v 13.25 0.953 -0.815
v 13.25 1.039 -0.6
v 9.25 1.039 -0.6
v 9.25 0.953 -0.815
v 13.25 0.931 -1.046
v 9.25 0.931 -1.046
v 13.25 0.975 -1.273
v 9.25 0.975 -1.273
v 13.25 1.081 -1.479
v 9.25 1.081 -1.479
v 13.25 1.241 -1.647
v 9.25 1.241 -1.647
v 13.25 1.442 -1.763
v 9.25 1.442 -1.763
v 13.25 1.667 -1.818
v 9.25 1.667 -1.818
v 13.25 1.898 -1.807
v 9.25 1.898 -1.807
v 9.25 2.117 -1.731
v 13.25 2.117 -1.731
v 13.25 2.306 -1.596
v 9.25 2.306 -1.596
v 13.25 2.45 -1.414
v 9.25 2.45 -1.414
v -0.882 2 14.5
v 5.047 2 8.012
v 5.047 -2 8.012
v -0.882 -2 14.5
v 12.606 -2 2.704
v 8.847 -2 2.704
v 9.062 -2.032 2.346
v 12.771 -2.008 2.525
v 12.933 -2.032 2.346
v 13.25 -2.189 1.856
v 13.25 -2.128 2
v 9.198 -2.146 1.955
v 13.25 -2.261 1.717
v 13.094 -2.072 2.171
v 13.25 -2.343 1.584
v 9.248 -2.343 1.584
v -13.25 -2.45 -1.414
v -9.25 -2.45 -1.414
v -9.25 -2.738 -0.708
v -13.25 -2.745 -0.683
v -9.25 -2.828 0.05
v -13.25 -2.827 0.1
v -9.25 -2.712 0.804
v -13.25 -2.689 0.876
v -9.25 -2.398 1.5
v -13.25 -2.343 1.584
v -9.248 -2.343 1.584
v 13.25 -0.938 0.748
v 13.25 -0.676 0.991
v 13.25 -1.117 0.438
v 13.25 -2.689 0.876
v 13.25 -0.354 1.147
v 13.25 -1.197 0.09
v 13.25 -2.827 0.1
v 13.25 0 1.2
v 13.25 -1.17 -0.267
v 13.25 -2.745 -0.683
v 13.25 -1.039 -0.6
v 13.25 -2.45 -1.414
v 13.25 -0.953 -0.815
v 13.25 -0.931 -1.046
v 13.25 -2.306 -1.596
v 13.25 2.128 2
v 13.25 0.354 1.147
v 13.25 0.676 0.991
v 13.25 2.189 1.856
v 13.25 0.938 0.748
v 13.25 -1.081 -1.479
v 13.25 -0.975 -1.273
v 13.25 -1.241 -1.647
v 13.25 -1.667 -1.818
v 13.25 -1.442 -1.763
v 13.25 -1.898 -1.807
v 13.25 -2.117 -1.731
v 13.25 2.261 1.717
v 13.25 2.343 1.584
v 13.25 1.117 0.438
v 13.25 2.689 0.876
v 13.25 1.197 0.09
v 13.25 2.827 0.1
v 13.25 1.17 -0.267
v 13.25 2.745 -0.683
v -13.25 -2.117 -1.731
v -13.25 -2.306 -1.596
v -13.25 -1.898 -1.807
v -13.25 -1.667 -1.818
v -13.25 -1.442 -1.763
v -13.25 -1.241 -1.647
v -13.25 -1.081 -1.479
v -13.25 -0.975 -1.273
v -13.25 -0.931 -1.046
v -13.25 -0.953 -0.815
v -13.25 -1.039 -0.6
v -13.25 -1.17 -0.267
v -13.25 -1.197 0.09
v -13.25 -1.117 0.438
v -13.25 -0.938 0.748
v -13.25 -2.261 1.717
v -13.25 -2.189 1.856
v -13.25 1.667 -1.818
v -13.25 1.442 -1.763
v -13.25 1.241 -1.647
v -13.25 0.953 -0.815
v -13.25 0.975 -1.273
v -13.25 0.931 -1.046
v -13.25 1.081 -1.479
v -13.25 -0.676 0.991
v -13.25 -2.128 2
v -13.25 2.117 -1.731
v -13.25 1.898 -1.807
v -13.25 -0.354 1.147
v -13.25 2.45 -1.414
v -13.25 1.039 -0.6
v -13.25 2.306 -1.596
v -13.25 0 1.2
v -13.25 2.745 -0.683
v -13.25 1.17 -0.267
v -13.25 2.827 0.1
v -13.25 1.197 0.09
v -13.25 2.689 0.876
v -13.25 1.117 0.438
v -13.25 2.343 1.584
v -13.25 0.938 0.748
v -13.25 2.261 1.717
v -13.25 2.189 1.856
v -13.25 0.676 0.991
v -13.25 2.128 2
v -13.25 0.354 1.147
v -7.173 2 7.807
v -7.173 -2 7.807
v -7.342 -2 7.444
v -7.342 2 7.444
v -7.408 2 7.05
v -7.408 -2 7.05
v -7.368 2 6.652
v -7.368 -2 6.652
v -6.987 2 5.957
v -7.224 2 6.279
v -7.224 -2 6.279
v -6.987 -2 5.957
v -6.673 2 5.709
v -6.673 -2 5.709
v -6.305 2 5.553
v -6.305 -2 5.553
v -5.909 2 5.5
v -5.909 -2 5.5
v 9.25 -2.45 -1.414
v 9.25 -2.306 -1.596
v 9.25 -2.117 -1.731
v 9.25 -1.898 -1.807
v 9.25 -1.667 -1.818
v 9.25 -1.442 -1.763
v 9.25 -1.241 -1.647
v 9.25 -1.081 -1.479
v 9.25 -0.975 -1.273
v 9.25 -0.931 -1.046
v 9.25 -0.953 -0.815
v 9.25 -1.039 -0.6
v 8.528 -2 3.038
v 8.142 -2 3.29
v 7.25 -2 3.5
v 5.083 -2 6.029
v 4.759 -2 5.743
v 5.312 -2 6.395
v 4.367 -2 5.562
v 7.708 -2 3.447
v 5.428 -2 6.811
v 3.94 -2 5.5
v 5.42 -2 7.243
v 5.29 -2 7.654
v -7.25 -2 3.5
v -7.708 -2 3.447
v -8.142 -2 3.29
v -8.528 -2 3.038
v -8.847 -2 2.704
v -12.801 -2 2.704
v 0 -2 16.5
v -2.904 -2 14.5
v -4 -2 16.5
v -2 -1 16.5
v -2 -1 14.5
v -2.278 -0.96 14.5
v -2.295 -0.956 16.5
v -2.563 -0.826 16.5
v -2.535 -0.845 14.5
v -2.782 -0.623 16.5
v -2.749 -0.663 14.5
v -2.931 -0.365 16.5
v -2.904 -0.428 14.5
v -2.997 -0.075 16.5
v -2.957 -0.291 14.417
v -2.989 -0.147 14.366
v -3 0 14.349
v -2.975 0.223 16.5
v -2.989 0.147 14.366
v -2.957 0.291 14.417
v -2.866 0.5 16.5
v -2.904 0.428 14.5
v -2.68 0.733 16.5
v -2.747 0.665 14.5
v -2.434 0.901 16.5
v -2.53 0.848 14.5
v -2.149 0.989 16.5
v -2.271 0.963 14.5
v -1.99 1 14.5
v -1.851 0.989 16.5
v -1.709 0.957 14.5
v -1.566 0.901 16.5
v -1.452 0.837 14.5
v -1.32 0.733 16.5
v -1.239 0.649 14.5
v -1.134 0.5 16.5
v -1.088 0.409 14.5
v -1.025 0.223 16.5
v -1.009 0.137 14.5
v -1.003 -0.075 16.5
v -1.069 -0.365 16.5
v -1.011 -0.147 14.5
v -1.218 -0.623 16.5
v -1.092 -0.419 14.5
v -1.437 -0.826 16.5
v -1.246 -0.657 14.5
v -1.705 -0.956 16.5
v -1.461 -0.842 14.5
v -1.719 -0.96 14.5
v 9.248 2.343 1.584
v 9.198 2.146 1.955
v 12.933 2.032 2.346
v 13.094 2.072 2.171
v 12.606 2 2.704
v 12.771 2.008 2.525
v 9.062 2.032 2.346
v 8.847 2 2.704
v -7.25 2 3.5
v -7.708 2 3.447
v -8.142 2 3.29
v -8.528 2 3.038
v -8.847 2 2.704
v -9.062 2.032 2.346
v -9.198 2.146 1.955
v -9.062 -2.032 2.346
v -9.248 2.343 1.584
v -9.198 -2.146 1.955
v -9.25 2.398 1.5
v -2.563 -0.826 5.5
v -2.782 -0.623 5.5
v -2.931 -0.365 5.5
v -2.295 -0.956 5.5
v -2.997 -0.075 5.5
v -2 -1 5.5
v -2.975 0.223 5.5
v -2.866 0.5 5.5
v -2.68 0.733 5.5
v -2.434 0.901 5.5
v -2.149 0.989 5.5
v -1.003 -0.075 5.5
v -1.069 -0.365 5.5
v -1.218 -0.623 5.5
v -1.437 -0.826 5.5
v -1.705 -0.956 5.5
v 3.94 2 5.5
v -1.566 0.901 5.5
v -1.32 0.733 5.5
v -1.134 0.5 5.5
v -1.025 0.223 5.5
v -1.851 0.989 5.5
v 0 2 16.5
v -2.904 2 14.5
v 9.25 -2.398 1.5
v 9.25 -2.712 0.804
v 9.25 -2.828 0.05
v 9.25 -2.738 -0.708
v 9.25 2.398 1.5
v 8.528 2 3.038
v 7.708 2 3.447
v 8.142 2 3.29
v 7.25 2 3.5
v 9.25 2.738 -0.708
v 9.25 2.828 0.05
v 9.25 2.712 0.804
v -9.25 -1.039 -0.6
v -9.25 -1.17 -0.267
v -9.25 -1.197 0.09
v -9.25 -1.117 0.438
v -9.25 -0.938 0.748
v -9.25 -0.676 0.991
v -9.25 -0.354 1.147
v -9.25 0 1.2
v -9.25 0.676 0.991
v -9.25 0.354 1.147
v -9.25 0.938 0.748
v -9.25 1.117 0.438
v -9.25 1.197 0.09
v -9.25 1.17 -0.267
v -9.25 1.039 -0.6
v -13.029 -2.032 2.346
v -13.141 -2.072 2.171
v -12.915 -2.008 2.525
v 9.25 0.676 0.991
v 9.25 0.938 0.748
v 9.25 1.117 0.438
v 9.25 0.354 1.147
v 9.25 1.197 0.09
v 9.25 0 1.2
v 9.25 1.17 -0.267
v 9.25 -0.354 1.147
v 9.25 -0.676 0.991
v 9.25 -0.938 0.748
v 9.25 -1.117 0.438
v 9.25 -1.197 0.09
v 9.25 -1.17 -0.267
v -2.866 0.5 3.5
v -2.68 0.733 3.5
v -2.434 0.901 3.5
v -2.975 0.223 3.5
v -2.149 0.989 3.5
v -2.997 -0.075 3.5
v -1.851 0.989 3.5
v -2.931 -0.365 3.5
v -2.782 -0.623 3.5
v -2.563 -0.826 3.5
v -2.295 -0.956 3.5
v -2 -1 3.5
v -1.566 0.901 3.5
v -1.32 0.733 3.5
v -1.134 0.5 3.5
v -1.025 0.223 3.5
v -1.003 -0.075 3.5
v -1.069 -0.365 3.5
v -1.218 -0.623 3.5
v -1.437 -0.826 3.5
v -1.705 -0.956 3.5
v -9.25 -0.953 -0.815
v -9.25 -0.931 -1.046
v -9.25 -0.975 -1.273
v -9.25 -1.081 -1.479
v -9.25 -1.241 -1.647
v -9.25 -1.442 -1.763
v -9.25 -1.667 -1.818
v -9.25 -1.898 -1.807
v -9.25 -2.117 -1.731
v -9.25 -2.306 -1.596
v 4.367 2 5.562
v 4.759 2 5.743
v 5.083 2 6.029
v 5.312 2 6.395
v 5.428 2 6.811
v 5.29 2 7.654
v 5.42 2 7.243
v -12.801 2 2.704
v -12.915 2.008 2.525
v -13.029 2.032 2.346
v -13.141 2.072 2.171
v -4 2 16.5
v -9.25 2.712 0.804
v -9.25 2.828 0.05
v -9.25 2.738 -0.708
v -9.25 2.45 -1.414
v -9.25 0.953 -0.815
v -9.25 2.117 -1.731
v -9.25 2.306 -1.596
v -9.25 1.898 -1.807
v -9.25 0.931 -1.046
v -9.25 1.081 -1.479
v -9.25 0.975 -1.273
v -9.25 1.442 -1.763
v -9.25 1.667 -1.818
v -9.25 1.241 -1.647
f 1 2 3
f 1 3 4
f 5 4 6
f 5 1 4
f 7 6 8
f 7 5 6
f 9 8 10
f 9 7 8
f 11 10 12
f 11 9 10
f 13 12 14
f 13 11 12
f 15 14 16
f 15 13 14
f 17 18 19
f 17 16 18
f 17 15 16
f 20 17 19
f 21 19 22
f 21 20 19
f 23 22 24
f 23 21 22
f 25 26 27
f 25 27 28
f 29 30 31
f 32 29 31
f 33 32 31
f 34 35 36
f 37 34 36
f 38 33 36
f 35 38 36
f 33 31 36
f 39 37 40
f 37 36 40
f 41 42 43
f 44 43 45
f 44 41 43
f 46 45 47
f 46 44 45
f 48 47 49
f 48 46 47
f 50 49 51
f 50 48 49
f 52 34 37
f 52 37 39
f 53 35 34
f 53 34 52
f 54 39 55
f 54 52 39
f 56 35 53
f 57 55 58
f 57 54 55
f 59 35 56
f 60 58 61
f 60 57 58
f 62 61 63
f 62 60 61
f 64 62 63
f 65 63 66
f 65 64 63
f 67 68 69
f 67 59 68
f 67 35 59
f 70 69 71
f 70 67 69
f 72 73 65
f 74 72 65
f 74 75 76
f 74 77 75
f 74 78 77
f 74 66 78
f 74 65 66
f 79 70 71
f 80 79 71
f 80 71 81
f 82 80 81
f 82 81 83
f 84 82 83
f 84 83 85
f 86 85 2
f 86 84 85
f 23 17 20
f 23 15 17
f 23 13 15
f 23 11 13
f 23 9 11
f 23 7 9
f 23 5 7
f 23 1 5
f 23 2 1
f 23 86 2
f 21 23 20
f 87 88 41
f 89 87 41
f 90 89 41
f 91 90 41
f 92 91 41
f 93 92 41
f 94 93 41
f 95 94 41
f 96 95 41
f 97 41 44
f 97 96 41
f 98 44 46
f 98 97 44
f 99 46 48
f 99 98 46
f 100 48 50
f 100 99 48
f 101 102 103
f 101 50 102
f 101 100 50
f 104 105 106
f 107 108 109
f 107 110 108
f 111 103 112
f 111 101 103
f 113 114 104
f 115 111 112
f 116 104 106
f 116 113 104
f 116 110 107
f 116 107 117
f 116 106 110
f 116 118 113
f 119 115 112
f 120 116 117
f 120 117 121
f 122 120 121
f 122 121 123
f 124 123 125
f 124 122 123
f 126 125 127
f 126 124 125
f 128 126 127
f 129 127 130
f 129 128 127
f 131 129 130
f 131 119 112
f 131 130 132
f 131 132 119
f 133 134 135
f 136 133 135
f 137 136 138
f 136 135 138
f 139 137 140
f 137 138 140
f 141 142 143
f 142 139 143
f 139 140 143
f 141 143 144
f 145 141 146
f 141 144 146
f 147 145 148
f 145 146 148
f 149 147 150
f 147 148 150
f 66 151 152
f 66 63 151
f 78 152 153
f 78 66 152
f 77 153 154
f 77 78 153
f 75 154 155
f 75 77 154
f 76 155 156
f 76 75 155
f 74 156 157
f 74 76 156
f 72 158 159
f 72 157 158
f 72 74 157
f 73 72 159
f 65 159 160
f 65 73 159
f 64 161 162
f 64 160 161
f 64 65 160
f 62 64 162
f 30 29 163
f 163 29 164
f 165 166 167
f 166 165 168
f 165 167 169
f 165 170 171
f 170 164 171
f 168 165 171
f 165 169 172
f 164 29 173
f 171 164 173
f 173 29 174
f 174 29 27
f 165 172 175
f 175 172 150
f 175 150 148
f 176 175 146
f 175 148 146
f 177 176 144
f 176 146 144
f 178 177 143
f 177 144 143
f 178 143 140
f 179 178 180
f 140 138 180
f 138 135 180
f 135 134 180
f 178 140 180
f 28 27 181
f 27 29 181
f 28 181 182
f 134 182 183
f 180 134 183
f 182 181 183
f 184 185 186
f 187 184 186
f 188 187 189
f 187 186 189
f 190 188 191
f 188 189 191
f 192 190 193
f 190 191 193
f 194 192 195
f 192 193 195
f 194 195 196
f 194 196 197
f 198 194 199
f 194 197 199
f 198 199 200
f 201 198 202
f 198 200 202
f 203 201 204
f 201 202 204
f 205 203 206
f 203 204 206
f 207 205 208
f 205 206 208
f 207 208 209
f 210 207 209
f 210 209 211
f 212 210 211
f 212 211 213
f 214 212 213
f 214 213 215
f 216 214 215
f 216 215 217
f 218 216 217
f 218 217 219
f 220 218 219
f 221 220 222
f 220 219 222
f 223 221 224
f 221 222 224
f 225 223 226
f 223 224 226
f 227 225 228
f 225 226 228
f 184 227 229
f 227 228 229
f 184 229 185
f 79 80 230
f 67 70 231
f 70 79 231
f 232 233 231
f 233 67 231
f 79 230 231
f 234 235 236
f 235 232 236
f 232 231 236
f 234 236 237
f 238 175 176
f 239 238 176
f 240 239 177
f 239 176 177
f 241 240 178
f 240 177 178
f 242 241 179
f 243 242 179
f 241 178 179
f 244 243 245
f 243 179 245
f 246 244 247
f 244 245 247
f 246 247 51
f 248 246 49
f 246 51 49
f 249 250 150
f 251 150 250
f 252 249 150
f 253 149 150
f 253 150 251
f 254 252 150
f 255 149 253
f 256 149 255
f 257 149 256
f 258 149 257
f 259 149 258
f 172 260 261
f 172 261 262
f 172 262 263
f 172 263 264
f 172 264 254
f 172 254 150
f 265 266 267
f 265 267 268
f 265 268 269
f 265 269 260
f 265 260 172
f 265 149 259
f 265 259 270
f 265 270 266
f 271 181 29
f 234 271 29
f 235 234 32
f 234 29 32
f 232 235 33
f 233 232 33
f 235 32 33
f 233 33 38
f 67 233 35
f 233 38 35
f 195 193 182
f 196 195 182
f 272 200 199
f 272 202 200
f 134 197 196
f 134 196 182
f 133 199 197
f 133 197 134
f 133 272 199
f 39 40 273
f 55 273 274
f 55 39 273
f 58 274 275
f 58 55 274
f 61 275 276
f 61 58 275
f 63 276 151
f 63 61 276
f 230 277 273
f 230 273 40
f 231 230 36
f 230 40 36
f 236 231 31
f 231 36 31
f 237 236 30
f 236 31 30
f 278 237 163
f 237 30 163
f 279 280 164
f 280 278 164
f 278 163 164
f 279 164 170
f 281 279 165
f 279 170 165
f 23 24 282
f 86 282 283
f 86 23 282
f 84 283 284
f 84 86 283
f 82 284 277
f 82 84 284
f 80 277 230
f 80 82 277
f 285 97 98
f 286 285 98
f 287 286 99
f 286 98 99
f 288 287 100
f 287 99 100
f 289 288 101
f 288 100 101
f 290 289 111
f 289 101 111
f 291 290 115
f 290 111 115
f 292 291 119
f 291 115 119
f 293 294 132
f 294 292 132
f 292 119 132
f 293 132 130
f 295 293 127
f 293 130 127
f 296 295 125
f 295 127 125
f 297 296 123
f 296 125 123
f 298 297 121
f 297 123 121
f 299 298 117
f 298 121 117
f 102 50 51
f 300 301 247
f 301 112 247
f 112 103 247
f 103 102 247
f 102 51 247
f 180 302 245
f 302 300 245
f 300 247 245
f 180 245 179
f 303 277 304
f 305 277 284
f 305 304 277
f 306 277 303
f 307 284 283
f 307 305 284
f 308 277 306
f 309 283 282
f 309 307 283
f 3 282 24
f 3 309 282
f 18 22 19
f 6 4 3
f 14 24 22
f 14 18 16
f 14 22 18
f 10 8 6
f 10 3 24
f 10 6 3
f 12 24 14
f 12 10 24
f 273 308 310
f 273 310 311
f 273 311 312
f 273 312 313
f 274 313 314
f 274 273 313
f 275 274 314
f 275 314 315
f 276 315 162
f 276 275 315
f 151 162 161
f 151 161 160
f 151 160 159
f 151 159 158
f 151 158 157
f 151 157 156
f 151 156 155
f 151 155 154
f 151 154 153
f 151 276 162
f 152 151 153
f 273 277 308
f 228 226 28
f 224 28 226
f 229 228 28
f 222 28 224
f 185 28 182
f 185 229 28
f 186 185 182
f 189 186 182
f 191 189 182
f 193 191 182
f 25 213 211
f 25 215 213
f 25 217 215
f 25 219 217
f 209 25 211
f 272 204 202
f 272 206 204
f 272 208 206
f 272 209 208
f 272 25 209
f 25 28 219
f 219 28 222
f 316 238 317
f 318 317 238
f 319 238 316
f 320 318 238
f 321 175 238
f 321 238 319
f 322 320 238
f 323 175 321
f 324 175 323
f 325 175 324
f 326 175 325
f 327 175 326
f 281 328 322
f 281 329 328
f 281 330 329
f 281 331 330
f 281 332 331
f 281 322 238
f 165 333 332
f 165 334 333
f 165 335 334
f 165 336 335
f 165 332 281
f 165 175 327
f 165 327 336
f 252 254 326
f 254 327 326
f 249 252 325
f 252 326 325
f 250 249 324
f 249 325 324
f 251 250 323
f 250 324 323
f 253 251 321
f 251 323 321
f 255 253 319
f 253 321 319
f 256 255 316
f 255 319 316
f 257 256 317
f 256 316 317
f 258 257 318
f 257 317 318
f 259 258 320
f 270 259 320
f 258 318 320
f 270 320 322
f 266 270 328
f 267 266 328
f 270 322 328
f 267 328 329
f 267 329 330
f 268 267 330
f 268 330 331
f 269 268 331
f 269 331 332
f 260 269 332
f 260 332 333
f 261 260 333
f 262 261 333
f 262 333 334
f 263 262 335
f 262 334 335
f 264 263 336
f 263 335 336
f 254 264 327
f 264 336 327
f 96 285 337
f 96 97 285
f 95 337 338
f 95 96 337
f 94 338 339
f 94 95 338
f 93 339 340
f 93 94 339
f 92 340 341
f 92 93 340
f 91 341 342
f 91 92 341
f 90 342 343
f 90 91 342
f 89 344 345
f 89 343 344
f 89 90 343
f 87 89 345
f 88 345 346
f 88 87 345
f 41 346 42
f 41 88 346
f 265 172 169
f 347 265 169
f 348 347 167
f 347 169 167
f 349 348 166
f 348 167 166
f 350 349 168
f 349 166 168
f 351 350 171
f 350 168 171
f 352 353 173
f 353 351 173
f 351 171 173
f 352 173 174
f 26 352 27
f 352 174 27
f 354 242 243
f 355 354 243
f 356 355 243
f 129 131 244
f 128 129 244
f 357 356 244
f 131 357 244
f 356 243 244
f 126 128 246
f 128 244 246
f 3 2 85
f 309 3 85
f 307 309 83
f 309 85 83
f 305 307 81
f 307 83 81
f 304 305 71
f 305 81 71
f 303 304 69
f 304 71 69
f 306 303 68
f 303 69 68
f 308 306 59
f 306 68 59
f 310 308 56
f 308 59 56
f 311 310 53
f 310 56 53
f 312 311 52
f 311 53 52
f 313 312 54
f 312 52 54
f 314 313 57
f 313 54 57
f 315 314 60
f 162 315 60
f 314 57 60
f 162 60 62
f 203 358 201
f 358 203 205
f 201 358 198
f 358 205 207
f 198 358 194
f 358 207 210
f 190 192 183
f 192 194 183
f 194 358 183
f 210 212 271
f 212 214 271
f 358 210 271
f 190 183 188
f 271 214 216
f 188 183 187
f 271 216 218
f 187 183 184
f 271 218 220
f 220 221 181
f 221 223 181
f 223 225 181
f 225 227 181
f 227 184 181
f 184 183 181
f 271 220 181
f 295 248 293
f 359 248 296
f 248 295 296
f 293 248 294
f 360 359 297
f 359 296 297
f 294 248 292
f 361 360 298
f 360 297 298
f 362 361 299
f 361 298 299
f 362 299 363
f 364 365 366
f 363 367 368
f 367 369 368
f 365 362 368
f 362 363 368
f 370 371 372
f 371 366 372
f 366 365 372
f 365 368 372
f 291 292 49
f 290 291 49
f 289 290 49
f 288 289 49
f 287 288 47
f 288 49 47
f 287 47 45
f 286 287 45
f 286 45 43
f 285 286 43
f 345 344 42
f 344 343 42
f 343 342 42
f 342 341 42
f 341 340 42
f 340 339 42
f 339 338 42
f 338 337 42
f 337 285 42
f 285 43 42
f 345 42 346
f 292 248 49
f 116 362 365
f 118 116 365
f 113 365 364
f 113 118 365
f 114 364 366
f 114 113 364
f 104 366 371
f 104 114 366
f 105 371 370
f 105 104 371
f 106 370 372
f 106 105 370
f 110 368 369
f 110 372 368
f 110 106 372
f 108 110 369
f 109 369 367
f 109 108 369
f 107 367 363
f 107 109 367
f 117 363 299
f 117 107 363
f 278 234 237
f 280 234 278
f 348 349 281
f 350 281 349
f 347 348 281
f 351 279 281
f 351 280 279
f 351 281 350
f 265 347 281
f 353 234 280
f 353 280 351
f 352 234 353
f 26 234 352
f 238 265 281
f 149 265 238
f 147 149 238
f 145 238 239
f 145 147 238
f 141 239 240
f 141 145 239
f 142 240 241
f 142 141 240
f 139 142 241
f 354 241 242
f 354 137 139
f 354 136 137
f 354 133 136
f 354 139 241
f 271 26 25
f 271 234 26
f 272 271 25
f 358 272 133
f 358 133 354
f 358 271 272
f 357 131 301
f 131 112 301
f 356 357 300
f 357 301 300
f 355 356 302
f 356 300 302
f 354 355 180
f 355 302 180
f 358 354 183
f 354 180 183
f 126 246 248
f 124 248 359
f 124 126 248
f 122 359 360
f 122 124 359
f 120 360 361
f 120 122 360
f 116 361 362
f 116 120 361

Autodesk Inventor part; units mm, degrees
ref_plane "YZ Plane" through (0, 0, 0) normal (1, 0, 0) x (0, 1, 0)
ref_plane "XZ Plane" through (0, 0, 0) normal (0, 1, 0) x (-1, 0, 0)
ref_plane "XY Plane" through (0, 0, 0) normal (0, 0, 1) x (1, 0, 0)
sketch "スケッチ1" plane through (0, 0, 0) normal (0, 1, 0) x (-1, 0, 0)
  line L0 (13.25, -2) -> (-13.25, -2)
  line L1 (-13.25, -2) -> (-13.25, 2)
  line L2 (13.25, 2) -> (13.25, -2)
  line L3 (13.25, 2) -> (4, 16.5)
  line L4 (4, 16.5) -> (0, 16.5)
  line L5 (0, 16.5) -> (-13.25, 2)
  line L6 (9.25, 3.5) -> (-9.25, 3.5)
  line L7 (9.25, 3.5) -> (9.25, -2)
  line L8 (-9.25, 3.5) -> (-9.25, -2)
  point P0 (0, 0)
  point P1 (13.25, 0)
  point P2 (0, -2)
  point P3 (2, 16.5)
  dimension "d1" = 4
  dimension "d2" = 4
  dimension "d3" = 16.5
  dimension "d19" = 3.5
  dimension "d32" = 4
  dimension "d33" = 26.5
  dimension "d34" = 4
  dimension "d36" = 4
  dimension "d37" = 2
extrude "押し出し1" add sketch "スケッチ1" along normal mid plane 4 contours L0 L7 L6 L8 L1 L5 L4 L3 L2
sketch "スケッチ3" plane through (-4, 2, 16.5) normal (0, 0, 1) x (1, 0, 0)
  line L0 (0, 0) -> (4, 0) projected
  line L1 (0, -4) -> (0, 0) projected
  point P0 (4, -2)
  point P1 (2, -2)
  point P2 (0, -2)
  point P3 (2, 0)
hole "穴1" at (-2, 0, 16.5) direction (0, 0, -1) diameter 2 end through all
sketch "スケッチ4" plane through (13.25, -2, -2) normal (1, 0, 0) x (0, 0, -1)
  line L0 (0, 4) -> (0, 0) projected
  line L1 (-4, 0) -> (-4, 4) projected
  line L2 (0, 0) -> (-4, 0) projected
  circle A0 centre (-2, 2) radius 1.2
  line L3 (-4, 4) -> (0, 4) projected
  arc A1 (-4, 0) -> (-4, 4) centre (-2, 2) ccw
  circle A2 centre (-0.9929, 3.7444) radius 0.8142
  circle A3 centre (-0.9929, 0.2556) radius 0.8142
  line L4 (-0.9929, 3.7444) -> (-2, 2) construction
  line L5 (-2, 2) -> (-0.9929, 0.2556) construction
  line L6 (-0.9929, 1.0699) -> (-0.9929, 2.9301) construction
  line L7 (0, 2.2089) -> (-0.9929, 3.7444) construction
  point P0 (-2, 2)
  point P1 (-1.4, 3.0392)
  point P2 (-1.4, 0.9608)
  point P3 (-0.2199, 0)
  point P4 (-0.2199, 4)
  point P5 (-0.5858, 4.4495)
  point P6 (-0.5858, -0.4495)
  dimension "d22" = 1.6284
  dimension "d20" = 2.4
  dimension "d21" = 120
  dimension "d23" = 1.8603
extrude "押し出し3" add sketch "スケッチ4" against normal up to surface (4 mm away)
extrude "押し出し4" cut sketch "スケッチ4" against normal up to surface (4 mm away) contours A1 L0 | L0 L2 A3 A0 A2 L3 | L3 A2 A1 | A1 A3 L2 | A0 picked at (-0.1339, 4.0556) picked at (-0.1339, -0.0556)
mirror "ミラー1" about plane through (0, 0, 0) normal (1, 0, 0) of "押し出し3", "押し出し4"
sketch "スケッチ5" plane through (0, 2, 0) normal (0, 1, 0) x (1, 0, 0)
  line L0 (-13.25, -2) -> (-4, -16.5) projected
  line L1 (-4, -16.5) -> (0, -16.5) projected
  line L2 (0, -16.5) -> (13.25, -2) projected
  line L3 (9.25, -3.5) -> (-9.25, -3.5) projected
  line L4 (-2.9036, -14.5) -> (-8.6449, -5.5)
  line L5 (7.3425, -5.5) -> (-0.8817, -14.5)
  line L6 (-0.8817, -14.5) -> (-2.9036, -14.5)
  line L7 (-8.6449, -5.5) -> (7.3425, -5.5)
  point P0 (0, 0)
  dimension "d38" = 2
  dimension "d40" = 2
  dimension "d41" = 2
extrude "押し出し5" cut sketch "スケッチ5" against normal through all
fillet "フィレット4" radius 1.5 2 edges at (-8.6449, 0, 5.5) (7.3425, 0, 5.5)
fillet "フィレット5" radius 2 6 edges at (9.25, 0, 3.5) (-9.25, 0, 3.5) (-11.25, 2, 2) (11.25, 2, 2) (11.25, -2, 2) (-11.25, -2, 2)
equation "\"d34\" = d32"
equation "\"d36\" = d1"
equation "\"d37\" = 0.5 * d32"
equation "\"d40\" = d38"
equation "\"d41\" = d38"
properties part number "GearBase" material "ABS プラスチック"
